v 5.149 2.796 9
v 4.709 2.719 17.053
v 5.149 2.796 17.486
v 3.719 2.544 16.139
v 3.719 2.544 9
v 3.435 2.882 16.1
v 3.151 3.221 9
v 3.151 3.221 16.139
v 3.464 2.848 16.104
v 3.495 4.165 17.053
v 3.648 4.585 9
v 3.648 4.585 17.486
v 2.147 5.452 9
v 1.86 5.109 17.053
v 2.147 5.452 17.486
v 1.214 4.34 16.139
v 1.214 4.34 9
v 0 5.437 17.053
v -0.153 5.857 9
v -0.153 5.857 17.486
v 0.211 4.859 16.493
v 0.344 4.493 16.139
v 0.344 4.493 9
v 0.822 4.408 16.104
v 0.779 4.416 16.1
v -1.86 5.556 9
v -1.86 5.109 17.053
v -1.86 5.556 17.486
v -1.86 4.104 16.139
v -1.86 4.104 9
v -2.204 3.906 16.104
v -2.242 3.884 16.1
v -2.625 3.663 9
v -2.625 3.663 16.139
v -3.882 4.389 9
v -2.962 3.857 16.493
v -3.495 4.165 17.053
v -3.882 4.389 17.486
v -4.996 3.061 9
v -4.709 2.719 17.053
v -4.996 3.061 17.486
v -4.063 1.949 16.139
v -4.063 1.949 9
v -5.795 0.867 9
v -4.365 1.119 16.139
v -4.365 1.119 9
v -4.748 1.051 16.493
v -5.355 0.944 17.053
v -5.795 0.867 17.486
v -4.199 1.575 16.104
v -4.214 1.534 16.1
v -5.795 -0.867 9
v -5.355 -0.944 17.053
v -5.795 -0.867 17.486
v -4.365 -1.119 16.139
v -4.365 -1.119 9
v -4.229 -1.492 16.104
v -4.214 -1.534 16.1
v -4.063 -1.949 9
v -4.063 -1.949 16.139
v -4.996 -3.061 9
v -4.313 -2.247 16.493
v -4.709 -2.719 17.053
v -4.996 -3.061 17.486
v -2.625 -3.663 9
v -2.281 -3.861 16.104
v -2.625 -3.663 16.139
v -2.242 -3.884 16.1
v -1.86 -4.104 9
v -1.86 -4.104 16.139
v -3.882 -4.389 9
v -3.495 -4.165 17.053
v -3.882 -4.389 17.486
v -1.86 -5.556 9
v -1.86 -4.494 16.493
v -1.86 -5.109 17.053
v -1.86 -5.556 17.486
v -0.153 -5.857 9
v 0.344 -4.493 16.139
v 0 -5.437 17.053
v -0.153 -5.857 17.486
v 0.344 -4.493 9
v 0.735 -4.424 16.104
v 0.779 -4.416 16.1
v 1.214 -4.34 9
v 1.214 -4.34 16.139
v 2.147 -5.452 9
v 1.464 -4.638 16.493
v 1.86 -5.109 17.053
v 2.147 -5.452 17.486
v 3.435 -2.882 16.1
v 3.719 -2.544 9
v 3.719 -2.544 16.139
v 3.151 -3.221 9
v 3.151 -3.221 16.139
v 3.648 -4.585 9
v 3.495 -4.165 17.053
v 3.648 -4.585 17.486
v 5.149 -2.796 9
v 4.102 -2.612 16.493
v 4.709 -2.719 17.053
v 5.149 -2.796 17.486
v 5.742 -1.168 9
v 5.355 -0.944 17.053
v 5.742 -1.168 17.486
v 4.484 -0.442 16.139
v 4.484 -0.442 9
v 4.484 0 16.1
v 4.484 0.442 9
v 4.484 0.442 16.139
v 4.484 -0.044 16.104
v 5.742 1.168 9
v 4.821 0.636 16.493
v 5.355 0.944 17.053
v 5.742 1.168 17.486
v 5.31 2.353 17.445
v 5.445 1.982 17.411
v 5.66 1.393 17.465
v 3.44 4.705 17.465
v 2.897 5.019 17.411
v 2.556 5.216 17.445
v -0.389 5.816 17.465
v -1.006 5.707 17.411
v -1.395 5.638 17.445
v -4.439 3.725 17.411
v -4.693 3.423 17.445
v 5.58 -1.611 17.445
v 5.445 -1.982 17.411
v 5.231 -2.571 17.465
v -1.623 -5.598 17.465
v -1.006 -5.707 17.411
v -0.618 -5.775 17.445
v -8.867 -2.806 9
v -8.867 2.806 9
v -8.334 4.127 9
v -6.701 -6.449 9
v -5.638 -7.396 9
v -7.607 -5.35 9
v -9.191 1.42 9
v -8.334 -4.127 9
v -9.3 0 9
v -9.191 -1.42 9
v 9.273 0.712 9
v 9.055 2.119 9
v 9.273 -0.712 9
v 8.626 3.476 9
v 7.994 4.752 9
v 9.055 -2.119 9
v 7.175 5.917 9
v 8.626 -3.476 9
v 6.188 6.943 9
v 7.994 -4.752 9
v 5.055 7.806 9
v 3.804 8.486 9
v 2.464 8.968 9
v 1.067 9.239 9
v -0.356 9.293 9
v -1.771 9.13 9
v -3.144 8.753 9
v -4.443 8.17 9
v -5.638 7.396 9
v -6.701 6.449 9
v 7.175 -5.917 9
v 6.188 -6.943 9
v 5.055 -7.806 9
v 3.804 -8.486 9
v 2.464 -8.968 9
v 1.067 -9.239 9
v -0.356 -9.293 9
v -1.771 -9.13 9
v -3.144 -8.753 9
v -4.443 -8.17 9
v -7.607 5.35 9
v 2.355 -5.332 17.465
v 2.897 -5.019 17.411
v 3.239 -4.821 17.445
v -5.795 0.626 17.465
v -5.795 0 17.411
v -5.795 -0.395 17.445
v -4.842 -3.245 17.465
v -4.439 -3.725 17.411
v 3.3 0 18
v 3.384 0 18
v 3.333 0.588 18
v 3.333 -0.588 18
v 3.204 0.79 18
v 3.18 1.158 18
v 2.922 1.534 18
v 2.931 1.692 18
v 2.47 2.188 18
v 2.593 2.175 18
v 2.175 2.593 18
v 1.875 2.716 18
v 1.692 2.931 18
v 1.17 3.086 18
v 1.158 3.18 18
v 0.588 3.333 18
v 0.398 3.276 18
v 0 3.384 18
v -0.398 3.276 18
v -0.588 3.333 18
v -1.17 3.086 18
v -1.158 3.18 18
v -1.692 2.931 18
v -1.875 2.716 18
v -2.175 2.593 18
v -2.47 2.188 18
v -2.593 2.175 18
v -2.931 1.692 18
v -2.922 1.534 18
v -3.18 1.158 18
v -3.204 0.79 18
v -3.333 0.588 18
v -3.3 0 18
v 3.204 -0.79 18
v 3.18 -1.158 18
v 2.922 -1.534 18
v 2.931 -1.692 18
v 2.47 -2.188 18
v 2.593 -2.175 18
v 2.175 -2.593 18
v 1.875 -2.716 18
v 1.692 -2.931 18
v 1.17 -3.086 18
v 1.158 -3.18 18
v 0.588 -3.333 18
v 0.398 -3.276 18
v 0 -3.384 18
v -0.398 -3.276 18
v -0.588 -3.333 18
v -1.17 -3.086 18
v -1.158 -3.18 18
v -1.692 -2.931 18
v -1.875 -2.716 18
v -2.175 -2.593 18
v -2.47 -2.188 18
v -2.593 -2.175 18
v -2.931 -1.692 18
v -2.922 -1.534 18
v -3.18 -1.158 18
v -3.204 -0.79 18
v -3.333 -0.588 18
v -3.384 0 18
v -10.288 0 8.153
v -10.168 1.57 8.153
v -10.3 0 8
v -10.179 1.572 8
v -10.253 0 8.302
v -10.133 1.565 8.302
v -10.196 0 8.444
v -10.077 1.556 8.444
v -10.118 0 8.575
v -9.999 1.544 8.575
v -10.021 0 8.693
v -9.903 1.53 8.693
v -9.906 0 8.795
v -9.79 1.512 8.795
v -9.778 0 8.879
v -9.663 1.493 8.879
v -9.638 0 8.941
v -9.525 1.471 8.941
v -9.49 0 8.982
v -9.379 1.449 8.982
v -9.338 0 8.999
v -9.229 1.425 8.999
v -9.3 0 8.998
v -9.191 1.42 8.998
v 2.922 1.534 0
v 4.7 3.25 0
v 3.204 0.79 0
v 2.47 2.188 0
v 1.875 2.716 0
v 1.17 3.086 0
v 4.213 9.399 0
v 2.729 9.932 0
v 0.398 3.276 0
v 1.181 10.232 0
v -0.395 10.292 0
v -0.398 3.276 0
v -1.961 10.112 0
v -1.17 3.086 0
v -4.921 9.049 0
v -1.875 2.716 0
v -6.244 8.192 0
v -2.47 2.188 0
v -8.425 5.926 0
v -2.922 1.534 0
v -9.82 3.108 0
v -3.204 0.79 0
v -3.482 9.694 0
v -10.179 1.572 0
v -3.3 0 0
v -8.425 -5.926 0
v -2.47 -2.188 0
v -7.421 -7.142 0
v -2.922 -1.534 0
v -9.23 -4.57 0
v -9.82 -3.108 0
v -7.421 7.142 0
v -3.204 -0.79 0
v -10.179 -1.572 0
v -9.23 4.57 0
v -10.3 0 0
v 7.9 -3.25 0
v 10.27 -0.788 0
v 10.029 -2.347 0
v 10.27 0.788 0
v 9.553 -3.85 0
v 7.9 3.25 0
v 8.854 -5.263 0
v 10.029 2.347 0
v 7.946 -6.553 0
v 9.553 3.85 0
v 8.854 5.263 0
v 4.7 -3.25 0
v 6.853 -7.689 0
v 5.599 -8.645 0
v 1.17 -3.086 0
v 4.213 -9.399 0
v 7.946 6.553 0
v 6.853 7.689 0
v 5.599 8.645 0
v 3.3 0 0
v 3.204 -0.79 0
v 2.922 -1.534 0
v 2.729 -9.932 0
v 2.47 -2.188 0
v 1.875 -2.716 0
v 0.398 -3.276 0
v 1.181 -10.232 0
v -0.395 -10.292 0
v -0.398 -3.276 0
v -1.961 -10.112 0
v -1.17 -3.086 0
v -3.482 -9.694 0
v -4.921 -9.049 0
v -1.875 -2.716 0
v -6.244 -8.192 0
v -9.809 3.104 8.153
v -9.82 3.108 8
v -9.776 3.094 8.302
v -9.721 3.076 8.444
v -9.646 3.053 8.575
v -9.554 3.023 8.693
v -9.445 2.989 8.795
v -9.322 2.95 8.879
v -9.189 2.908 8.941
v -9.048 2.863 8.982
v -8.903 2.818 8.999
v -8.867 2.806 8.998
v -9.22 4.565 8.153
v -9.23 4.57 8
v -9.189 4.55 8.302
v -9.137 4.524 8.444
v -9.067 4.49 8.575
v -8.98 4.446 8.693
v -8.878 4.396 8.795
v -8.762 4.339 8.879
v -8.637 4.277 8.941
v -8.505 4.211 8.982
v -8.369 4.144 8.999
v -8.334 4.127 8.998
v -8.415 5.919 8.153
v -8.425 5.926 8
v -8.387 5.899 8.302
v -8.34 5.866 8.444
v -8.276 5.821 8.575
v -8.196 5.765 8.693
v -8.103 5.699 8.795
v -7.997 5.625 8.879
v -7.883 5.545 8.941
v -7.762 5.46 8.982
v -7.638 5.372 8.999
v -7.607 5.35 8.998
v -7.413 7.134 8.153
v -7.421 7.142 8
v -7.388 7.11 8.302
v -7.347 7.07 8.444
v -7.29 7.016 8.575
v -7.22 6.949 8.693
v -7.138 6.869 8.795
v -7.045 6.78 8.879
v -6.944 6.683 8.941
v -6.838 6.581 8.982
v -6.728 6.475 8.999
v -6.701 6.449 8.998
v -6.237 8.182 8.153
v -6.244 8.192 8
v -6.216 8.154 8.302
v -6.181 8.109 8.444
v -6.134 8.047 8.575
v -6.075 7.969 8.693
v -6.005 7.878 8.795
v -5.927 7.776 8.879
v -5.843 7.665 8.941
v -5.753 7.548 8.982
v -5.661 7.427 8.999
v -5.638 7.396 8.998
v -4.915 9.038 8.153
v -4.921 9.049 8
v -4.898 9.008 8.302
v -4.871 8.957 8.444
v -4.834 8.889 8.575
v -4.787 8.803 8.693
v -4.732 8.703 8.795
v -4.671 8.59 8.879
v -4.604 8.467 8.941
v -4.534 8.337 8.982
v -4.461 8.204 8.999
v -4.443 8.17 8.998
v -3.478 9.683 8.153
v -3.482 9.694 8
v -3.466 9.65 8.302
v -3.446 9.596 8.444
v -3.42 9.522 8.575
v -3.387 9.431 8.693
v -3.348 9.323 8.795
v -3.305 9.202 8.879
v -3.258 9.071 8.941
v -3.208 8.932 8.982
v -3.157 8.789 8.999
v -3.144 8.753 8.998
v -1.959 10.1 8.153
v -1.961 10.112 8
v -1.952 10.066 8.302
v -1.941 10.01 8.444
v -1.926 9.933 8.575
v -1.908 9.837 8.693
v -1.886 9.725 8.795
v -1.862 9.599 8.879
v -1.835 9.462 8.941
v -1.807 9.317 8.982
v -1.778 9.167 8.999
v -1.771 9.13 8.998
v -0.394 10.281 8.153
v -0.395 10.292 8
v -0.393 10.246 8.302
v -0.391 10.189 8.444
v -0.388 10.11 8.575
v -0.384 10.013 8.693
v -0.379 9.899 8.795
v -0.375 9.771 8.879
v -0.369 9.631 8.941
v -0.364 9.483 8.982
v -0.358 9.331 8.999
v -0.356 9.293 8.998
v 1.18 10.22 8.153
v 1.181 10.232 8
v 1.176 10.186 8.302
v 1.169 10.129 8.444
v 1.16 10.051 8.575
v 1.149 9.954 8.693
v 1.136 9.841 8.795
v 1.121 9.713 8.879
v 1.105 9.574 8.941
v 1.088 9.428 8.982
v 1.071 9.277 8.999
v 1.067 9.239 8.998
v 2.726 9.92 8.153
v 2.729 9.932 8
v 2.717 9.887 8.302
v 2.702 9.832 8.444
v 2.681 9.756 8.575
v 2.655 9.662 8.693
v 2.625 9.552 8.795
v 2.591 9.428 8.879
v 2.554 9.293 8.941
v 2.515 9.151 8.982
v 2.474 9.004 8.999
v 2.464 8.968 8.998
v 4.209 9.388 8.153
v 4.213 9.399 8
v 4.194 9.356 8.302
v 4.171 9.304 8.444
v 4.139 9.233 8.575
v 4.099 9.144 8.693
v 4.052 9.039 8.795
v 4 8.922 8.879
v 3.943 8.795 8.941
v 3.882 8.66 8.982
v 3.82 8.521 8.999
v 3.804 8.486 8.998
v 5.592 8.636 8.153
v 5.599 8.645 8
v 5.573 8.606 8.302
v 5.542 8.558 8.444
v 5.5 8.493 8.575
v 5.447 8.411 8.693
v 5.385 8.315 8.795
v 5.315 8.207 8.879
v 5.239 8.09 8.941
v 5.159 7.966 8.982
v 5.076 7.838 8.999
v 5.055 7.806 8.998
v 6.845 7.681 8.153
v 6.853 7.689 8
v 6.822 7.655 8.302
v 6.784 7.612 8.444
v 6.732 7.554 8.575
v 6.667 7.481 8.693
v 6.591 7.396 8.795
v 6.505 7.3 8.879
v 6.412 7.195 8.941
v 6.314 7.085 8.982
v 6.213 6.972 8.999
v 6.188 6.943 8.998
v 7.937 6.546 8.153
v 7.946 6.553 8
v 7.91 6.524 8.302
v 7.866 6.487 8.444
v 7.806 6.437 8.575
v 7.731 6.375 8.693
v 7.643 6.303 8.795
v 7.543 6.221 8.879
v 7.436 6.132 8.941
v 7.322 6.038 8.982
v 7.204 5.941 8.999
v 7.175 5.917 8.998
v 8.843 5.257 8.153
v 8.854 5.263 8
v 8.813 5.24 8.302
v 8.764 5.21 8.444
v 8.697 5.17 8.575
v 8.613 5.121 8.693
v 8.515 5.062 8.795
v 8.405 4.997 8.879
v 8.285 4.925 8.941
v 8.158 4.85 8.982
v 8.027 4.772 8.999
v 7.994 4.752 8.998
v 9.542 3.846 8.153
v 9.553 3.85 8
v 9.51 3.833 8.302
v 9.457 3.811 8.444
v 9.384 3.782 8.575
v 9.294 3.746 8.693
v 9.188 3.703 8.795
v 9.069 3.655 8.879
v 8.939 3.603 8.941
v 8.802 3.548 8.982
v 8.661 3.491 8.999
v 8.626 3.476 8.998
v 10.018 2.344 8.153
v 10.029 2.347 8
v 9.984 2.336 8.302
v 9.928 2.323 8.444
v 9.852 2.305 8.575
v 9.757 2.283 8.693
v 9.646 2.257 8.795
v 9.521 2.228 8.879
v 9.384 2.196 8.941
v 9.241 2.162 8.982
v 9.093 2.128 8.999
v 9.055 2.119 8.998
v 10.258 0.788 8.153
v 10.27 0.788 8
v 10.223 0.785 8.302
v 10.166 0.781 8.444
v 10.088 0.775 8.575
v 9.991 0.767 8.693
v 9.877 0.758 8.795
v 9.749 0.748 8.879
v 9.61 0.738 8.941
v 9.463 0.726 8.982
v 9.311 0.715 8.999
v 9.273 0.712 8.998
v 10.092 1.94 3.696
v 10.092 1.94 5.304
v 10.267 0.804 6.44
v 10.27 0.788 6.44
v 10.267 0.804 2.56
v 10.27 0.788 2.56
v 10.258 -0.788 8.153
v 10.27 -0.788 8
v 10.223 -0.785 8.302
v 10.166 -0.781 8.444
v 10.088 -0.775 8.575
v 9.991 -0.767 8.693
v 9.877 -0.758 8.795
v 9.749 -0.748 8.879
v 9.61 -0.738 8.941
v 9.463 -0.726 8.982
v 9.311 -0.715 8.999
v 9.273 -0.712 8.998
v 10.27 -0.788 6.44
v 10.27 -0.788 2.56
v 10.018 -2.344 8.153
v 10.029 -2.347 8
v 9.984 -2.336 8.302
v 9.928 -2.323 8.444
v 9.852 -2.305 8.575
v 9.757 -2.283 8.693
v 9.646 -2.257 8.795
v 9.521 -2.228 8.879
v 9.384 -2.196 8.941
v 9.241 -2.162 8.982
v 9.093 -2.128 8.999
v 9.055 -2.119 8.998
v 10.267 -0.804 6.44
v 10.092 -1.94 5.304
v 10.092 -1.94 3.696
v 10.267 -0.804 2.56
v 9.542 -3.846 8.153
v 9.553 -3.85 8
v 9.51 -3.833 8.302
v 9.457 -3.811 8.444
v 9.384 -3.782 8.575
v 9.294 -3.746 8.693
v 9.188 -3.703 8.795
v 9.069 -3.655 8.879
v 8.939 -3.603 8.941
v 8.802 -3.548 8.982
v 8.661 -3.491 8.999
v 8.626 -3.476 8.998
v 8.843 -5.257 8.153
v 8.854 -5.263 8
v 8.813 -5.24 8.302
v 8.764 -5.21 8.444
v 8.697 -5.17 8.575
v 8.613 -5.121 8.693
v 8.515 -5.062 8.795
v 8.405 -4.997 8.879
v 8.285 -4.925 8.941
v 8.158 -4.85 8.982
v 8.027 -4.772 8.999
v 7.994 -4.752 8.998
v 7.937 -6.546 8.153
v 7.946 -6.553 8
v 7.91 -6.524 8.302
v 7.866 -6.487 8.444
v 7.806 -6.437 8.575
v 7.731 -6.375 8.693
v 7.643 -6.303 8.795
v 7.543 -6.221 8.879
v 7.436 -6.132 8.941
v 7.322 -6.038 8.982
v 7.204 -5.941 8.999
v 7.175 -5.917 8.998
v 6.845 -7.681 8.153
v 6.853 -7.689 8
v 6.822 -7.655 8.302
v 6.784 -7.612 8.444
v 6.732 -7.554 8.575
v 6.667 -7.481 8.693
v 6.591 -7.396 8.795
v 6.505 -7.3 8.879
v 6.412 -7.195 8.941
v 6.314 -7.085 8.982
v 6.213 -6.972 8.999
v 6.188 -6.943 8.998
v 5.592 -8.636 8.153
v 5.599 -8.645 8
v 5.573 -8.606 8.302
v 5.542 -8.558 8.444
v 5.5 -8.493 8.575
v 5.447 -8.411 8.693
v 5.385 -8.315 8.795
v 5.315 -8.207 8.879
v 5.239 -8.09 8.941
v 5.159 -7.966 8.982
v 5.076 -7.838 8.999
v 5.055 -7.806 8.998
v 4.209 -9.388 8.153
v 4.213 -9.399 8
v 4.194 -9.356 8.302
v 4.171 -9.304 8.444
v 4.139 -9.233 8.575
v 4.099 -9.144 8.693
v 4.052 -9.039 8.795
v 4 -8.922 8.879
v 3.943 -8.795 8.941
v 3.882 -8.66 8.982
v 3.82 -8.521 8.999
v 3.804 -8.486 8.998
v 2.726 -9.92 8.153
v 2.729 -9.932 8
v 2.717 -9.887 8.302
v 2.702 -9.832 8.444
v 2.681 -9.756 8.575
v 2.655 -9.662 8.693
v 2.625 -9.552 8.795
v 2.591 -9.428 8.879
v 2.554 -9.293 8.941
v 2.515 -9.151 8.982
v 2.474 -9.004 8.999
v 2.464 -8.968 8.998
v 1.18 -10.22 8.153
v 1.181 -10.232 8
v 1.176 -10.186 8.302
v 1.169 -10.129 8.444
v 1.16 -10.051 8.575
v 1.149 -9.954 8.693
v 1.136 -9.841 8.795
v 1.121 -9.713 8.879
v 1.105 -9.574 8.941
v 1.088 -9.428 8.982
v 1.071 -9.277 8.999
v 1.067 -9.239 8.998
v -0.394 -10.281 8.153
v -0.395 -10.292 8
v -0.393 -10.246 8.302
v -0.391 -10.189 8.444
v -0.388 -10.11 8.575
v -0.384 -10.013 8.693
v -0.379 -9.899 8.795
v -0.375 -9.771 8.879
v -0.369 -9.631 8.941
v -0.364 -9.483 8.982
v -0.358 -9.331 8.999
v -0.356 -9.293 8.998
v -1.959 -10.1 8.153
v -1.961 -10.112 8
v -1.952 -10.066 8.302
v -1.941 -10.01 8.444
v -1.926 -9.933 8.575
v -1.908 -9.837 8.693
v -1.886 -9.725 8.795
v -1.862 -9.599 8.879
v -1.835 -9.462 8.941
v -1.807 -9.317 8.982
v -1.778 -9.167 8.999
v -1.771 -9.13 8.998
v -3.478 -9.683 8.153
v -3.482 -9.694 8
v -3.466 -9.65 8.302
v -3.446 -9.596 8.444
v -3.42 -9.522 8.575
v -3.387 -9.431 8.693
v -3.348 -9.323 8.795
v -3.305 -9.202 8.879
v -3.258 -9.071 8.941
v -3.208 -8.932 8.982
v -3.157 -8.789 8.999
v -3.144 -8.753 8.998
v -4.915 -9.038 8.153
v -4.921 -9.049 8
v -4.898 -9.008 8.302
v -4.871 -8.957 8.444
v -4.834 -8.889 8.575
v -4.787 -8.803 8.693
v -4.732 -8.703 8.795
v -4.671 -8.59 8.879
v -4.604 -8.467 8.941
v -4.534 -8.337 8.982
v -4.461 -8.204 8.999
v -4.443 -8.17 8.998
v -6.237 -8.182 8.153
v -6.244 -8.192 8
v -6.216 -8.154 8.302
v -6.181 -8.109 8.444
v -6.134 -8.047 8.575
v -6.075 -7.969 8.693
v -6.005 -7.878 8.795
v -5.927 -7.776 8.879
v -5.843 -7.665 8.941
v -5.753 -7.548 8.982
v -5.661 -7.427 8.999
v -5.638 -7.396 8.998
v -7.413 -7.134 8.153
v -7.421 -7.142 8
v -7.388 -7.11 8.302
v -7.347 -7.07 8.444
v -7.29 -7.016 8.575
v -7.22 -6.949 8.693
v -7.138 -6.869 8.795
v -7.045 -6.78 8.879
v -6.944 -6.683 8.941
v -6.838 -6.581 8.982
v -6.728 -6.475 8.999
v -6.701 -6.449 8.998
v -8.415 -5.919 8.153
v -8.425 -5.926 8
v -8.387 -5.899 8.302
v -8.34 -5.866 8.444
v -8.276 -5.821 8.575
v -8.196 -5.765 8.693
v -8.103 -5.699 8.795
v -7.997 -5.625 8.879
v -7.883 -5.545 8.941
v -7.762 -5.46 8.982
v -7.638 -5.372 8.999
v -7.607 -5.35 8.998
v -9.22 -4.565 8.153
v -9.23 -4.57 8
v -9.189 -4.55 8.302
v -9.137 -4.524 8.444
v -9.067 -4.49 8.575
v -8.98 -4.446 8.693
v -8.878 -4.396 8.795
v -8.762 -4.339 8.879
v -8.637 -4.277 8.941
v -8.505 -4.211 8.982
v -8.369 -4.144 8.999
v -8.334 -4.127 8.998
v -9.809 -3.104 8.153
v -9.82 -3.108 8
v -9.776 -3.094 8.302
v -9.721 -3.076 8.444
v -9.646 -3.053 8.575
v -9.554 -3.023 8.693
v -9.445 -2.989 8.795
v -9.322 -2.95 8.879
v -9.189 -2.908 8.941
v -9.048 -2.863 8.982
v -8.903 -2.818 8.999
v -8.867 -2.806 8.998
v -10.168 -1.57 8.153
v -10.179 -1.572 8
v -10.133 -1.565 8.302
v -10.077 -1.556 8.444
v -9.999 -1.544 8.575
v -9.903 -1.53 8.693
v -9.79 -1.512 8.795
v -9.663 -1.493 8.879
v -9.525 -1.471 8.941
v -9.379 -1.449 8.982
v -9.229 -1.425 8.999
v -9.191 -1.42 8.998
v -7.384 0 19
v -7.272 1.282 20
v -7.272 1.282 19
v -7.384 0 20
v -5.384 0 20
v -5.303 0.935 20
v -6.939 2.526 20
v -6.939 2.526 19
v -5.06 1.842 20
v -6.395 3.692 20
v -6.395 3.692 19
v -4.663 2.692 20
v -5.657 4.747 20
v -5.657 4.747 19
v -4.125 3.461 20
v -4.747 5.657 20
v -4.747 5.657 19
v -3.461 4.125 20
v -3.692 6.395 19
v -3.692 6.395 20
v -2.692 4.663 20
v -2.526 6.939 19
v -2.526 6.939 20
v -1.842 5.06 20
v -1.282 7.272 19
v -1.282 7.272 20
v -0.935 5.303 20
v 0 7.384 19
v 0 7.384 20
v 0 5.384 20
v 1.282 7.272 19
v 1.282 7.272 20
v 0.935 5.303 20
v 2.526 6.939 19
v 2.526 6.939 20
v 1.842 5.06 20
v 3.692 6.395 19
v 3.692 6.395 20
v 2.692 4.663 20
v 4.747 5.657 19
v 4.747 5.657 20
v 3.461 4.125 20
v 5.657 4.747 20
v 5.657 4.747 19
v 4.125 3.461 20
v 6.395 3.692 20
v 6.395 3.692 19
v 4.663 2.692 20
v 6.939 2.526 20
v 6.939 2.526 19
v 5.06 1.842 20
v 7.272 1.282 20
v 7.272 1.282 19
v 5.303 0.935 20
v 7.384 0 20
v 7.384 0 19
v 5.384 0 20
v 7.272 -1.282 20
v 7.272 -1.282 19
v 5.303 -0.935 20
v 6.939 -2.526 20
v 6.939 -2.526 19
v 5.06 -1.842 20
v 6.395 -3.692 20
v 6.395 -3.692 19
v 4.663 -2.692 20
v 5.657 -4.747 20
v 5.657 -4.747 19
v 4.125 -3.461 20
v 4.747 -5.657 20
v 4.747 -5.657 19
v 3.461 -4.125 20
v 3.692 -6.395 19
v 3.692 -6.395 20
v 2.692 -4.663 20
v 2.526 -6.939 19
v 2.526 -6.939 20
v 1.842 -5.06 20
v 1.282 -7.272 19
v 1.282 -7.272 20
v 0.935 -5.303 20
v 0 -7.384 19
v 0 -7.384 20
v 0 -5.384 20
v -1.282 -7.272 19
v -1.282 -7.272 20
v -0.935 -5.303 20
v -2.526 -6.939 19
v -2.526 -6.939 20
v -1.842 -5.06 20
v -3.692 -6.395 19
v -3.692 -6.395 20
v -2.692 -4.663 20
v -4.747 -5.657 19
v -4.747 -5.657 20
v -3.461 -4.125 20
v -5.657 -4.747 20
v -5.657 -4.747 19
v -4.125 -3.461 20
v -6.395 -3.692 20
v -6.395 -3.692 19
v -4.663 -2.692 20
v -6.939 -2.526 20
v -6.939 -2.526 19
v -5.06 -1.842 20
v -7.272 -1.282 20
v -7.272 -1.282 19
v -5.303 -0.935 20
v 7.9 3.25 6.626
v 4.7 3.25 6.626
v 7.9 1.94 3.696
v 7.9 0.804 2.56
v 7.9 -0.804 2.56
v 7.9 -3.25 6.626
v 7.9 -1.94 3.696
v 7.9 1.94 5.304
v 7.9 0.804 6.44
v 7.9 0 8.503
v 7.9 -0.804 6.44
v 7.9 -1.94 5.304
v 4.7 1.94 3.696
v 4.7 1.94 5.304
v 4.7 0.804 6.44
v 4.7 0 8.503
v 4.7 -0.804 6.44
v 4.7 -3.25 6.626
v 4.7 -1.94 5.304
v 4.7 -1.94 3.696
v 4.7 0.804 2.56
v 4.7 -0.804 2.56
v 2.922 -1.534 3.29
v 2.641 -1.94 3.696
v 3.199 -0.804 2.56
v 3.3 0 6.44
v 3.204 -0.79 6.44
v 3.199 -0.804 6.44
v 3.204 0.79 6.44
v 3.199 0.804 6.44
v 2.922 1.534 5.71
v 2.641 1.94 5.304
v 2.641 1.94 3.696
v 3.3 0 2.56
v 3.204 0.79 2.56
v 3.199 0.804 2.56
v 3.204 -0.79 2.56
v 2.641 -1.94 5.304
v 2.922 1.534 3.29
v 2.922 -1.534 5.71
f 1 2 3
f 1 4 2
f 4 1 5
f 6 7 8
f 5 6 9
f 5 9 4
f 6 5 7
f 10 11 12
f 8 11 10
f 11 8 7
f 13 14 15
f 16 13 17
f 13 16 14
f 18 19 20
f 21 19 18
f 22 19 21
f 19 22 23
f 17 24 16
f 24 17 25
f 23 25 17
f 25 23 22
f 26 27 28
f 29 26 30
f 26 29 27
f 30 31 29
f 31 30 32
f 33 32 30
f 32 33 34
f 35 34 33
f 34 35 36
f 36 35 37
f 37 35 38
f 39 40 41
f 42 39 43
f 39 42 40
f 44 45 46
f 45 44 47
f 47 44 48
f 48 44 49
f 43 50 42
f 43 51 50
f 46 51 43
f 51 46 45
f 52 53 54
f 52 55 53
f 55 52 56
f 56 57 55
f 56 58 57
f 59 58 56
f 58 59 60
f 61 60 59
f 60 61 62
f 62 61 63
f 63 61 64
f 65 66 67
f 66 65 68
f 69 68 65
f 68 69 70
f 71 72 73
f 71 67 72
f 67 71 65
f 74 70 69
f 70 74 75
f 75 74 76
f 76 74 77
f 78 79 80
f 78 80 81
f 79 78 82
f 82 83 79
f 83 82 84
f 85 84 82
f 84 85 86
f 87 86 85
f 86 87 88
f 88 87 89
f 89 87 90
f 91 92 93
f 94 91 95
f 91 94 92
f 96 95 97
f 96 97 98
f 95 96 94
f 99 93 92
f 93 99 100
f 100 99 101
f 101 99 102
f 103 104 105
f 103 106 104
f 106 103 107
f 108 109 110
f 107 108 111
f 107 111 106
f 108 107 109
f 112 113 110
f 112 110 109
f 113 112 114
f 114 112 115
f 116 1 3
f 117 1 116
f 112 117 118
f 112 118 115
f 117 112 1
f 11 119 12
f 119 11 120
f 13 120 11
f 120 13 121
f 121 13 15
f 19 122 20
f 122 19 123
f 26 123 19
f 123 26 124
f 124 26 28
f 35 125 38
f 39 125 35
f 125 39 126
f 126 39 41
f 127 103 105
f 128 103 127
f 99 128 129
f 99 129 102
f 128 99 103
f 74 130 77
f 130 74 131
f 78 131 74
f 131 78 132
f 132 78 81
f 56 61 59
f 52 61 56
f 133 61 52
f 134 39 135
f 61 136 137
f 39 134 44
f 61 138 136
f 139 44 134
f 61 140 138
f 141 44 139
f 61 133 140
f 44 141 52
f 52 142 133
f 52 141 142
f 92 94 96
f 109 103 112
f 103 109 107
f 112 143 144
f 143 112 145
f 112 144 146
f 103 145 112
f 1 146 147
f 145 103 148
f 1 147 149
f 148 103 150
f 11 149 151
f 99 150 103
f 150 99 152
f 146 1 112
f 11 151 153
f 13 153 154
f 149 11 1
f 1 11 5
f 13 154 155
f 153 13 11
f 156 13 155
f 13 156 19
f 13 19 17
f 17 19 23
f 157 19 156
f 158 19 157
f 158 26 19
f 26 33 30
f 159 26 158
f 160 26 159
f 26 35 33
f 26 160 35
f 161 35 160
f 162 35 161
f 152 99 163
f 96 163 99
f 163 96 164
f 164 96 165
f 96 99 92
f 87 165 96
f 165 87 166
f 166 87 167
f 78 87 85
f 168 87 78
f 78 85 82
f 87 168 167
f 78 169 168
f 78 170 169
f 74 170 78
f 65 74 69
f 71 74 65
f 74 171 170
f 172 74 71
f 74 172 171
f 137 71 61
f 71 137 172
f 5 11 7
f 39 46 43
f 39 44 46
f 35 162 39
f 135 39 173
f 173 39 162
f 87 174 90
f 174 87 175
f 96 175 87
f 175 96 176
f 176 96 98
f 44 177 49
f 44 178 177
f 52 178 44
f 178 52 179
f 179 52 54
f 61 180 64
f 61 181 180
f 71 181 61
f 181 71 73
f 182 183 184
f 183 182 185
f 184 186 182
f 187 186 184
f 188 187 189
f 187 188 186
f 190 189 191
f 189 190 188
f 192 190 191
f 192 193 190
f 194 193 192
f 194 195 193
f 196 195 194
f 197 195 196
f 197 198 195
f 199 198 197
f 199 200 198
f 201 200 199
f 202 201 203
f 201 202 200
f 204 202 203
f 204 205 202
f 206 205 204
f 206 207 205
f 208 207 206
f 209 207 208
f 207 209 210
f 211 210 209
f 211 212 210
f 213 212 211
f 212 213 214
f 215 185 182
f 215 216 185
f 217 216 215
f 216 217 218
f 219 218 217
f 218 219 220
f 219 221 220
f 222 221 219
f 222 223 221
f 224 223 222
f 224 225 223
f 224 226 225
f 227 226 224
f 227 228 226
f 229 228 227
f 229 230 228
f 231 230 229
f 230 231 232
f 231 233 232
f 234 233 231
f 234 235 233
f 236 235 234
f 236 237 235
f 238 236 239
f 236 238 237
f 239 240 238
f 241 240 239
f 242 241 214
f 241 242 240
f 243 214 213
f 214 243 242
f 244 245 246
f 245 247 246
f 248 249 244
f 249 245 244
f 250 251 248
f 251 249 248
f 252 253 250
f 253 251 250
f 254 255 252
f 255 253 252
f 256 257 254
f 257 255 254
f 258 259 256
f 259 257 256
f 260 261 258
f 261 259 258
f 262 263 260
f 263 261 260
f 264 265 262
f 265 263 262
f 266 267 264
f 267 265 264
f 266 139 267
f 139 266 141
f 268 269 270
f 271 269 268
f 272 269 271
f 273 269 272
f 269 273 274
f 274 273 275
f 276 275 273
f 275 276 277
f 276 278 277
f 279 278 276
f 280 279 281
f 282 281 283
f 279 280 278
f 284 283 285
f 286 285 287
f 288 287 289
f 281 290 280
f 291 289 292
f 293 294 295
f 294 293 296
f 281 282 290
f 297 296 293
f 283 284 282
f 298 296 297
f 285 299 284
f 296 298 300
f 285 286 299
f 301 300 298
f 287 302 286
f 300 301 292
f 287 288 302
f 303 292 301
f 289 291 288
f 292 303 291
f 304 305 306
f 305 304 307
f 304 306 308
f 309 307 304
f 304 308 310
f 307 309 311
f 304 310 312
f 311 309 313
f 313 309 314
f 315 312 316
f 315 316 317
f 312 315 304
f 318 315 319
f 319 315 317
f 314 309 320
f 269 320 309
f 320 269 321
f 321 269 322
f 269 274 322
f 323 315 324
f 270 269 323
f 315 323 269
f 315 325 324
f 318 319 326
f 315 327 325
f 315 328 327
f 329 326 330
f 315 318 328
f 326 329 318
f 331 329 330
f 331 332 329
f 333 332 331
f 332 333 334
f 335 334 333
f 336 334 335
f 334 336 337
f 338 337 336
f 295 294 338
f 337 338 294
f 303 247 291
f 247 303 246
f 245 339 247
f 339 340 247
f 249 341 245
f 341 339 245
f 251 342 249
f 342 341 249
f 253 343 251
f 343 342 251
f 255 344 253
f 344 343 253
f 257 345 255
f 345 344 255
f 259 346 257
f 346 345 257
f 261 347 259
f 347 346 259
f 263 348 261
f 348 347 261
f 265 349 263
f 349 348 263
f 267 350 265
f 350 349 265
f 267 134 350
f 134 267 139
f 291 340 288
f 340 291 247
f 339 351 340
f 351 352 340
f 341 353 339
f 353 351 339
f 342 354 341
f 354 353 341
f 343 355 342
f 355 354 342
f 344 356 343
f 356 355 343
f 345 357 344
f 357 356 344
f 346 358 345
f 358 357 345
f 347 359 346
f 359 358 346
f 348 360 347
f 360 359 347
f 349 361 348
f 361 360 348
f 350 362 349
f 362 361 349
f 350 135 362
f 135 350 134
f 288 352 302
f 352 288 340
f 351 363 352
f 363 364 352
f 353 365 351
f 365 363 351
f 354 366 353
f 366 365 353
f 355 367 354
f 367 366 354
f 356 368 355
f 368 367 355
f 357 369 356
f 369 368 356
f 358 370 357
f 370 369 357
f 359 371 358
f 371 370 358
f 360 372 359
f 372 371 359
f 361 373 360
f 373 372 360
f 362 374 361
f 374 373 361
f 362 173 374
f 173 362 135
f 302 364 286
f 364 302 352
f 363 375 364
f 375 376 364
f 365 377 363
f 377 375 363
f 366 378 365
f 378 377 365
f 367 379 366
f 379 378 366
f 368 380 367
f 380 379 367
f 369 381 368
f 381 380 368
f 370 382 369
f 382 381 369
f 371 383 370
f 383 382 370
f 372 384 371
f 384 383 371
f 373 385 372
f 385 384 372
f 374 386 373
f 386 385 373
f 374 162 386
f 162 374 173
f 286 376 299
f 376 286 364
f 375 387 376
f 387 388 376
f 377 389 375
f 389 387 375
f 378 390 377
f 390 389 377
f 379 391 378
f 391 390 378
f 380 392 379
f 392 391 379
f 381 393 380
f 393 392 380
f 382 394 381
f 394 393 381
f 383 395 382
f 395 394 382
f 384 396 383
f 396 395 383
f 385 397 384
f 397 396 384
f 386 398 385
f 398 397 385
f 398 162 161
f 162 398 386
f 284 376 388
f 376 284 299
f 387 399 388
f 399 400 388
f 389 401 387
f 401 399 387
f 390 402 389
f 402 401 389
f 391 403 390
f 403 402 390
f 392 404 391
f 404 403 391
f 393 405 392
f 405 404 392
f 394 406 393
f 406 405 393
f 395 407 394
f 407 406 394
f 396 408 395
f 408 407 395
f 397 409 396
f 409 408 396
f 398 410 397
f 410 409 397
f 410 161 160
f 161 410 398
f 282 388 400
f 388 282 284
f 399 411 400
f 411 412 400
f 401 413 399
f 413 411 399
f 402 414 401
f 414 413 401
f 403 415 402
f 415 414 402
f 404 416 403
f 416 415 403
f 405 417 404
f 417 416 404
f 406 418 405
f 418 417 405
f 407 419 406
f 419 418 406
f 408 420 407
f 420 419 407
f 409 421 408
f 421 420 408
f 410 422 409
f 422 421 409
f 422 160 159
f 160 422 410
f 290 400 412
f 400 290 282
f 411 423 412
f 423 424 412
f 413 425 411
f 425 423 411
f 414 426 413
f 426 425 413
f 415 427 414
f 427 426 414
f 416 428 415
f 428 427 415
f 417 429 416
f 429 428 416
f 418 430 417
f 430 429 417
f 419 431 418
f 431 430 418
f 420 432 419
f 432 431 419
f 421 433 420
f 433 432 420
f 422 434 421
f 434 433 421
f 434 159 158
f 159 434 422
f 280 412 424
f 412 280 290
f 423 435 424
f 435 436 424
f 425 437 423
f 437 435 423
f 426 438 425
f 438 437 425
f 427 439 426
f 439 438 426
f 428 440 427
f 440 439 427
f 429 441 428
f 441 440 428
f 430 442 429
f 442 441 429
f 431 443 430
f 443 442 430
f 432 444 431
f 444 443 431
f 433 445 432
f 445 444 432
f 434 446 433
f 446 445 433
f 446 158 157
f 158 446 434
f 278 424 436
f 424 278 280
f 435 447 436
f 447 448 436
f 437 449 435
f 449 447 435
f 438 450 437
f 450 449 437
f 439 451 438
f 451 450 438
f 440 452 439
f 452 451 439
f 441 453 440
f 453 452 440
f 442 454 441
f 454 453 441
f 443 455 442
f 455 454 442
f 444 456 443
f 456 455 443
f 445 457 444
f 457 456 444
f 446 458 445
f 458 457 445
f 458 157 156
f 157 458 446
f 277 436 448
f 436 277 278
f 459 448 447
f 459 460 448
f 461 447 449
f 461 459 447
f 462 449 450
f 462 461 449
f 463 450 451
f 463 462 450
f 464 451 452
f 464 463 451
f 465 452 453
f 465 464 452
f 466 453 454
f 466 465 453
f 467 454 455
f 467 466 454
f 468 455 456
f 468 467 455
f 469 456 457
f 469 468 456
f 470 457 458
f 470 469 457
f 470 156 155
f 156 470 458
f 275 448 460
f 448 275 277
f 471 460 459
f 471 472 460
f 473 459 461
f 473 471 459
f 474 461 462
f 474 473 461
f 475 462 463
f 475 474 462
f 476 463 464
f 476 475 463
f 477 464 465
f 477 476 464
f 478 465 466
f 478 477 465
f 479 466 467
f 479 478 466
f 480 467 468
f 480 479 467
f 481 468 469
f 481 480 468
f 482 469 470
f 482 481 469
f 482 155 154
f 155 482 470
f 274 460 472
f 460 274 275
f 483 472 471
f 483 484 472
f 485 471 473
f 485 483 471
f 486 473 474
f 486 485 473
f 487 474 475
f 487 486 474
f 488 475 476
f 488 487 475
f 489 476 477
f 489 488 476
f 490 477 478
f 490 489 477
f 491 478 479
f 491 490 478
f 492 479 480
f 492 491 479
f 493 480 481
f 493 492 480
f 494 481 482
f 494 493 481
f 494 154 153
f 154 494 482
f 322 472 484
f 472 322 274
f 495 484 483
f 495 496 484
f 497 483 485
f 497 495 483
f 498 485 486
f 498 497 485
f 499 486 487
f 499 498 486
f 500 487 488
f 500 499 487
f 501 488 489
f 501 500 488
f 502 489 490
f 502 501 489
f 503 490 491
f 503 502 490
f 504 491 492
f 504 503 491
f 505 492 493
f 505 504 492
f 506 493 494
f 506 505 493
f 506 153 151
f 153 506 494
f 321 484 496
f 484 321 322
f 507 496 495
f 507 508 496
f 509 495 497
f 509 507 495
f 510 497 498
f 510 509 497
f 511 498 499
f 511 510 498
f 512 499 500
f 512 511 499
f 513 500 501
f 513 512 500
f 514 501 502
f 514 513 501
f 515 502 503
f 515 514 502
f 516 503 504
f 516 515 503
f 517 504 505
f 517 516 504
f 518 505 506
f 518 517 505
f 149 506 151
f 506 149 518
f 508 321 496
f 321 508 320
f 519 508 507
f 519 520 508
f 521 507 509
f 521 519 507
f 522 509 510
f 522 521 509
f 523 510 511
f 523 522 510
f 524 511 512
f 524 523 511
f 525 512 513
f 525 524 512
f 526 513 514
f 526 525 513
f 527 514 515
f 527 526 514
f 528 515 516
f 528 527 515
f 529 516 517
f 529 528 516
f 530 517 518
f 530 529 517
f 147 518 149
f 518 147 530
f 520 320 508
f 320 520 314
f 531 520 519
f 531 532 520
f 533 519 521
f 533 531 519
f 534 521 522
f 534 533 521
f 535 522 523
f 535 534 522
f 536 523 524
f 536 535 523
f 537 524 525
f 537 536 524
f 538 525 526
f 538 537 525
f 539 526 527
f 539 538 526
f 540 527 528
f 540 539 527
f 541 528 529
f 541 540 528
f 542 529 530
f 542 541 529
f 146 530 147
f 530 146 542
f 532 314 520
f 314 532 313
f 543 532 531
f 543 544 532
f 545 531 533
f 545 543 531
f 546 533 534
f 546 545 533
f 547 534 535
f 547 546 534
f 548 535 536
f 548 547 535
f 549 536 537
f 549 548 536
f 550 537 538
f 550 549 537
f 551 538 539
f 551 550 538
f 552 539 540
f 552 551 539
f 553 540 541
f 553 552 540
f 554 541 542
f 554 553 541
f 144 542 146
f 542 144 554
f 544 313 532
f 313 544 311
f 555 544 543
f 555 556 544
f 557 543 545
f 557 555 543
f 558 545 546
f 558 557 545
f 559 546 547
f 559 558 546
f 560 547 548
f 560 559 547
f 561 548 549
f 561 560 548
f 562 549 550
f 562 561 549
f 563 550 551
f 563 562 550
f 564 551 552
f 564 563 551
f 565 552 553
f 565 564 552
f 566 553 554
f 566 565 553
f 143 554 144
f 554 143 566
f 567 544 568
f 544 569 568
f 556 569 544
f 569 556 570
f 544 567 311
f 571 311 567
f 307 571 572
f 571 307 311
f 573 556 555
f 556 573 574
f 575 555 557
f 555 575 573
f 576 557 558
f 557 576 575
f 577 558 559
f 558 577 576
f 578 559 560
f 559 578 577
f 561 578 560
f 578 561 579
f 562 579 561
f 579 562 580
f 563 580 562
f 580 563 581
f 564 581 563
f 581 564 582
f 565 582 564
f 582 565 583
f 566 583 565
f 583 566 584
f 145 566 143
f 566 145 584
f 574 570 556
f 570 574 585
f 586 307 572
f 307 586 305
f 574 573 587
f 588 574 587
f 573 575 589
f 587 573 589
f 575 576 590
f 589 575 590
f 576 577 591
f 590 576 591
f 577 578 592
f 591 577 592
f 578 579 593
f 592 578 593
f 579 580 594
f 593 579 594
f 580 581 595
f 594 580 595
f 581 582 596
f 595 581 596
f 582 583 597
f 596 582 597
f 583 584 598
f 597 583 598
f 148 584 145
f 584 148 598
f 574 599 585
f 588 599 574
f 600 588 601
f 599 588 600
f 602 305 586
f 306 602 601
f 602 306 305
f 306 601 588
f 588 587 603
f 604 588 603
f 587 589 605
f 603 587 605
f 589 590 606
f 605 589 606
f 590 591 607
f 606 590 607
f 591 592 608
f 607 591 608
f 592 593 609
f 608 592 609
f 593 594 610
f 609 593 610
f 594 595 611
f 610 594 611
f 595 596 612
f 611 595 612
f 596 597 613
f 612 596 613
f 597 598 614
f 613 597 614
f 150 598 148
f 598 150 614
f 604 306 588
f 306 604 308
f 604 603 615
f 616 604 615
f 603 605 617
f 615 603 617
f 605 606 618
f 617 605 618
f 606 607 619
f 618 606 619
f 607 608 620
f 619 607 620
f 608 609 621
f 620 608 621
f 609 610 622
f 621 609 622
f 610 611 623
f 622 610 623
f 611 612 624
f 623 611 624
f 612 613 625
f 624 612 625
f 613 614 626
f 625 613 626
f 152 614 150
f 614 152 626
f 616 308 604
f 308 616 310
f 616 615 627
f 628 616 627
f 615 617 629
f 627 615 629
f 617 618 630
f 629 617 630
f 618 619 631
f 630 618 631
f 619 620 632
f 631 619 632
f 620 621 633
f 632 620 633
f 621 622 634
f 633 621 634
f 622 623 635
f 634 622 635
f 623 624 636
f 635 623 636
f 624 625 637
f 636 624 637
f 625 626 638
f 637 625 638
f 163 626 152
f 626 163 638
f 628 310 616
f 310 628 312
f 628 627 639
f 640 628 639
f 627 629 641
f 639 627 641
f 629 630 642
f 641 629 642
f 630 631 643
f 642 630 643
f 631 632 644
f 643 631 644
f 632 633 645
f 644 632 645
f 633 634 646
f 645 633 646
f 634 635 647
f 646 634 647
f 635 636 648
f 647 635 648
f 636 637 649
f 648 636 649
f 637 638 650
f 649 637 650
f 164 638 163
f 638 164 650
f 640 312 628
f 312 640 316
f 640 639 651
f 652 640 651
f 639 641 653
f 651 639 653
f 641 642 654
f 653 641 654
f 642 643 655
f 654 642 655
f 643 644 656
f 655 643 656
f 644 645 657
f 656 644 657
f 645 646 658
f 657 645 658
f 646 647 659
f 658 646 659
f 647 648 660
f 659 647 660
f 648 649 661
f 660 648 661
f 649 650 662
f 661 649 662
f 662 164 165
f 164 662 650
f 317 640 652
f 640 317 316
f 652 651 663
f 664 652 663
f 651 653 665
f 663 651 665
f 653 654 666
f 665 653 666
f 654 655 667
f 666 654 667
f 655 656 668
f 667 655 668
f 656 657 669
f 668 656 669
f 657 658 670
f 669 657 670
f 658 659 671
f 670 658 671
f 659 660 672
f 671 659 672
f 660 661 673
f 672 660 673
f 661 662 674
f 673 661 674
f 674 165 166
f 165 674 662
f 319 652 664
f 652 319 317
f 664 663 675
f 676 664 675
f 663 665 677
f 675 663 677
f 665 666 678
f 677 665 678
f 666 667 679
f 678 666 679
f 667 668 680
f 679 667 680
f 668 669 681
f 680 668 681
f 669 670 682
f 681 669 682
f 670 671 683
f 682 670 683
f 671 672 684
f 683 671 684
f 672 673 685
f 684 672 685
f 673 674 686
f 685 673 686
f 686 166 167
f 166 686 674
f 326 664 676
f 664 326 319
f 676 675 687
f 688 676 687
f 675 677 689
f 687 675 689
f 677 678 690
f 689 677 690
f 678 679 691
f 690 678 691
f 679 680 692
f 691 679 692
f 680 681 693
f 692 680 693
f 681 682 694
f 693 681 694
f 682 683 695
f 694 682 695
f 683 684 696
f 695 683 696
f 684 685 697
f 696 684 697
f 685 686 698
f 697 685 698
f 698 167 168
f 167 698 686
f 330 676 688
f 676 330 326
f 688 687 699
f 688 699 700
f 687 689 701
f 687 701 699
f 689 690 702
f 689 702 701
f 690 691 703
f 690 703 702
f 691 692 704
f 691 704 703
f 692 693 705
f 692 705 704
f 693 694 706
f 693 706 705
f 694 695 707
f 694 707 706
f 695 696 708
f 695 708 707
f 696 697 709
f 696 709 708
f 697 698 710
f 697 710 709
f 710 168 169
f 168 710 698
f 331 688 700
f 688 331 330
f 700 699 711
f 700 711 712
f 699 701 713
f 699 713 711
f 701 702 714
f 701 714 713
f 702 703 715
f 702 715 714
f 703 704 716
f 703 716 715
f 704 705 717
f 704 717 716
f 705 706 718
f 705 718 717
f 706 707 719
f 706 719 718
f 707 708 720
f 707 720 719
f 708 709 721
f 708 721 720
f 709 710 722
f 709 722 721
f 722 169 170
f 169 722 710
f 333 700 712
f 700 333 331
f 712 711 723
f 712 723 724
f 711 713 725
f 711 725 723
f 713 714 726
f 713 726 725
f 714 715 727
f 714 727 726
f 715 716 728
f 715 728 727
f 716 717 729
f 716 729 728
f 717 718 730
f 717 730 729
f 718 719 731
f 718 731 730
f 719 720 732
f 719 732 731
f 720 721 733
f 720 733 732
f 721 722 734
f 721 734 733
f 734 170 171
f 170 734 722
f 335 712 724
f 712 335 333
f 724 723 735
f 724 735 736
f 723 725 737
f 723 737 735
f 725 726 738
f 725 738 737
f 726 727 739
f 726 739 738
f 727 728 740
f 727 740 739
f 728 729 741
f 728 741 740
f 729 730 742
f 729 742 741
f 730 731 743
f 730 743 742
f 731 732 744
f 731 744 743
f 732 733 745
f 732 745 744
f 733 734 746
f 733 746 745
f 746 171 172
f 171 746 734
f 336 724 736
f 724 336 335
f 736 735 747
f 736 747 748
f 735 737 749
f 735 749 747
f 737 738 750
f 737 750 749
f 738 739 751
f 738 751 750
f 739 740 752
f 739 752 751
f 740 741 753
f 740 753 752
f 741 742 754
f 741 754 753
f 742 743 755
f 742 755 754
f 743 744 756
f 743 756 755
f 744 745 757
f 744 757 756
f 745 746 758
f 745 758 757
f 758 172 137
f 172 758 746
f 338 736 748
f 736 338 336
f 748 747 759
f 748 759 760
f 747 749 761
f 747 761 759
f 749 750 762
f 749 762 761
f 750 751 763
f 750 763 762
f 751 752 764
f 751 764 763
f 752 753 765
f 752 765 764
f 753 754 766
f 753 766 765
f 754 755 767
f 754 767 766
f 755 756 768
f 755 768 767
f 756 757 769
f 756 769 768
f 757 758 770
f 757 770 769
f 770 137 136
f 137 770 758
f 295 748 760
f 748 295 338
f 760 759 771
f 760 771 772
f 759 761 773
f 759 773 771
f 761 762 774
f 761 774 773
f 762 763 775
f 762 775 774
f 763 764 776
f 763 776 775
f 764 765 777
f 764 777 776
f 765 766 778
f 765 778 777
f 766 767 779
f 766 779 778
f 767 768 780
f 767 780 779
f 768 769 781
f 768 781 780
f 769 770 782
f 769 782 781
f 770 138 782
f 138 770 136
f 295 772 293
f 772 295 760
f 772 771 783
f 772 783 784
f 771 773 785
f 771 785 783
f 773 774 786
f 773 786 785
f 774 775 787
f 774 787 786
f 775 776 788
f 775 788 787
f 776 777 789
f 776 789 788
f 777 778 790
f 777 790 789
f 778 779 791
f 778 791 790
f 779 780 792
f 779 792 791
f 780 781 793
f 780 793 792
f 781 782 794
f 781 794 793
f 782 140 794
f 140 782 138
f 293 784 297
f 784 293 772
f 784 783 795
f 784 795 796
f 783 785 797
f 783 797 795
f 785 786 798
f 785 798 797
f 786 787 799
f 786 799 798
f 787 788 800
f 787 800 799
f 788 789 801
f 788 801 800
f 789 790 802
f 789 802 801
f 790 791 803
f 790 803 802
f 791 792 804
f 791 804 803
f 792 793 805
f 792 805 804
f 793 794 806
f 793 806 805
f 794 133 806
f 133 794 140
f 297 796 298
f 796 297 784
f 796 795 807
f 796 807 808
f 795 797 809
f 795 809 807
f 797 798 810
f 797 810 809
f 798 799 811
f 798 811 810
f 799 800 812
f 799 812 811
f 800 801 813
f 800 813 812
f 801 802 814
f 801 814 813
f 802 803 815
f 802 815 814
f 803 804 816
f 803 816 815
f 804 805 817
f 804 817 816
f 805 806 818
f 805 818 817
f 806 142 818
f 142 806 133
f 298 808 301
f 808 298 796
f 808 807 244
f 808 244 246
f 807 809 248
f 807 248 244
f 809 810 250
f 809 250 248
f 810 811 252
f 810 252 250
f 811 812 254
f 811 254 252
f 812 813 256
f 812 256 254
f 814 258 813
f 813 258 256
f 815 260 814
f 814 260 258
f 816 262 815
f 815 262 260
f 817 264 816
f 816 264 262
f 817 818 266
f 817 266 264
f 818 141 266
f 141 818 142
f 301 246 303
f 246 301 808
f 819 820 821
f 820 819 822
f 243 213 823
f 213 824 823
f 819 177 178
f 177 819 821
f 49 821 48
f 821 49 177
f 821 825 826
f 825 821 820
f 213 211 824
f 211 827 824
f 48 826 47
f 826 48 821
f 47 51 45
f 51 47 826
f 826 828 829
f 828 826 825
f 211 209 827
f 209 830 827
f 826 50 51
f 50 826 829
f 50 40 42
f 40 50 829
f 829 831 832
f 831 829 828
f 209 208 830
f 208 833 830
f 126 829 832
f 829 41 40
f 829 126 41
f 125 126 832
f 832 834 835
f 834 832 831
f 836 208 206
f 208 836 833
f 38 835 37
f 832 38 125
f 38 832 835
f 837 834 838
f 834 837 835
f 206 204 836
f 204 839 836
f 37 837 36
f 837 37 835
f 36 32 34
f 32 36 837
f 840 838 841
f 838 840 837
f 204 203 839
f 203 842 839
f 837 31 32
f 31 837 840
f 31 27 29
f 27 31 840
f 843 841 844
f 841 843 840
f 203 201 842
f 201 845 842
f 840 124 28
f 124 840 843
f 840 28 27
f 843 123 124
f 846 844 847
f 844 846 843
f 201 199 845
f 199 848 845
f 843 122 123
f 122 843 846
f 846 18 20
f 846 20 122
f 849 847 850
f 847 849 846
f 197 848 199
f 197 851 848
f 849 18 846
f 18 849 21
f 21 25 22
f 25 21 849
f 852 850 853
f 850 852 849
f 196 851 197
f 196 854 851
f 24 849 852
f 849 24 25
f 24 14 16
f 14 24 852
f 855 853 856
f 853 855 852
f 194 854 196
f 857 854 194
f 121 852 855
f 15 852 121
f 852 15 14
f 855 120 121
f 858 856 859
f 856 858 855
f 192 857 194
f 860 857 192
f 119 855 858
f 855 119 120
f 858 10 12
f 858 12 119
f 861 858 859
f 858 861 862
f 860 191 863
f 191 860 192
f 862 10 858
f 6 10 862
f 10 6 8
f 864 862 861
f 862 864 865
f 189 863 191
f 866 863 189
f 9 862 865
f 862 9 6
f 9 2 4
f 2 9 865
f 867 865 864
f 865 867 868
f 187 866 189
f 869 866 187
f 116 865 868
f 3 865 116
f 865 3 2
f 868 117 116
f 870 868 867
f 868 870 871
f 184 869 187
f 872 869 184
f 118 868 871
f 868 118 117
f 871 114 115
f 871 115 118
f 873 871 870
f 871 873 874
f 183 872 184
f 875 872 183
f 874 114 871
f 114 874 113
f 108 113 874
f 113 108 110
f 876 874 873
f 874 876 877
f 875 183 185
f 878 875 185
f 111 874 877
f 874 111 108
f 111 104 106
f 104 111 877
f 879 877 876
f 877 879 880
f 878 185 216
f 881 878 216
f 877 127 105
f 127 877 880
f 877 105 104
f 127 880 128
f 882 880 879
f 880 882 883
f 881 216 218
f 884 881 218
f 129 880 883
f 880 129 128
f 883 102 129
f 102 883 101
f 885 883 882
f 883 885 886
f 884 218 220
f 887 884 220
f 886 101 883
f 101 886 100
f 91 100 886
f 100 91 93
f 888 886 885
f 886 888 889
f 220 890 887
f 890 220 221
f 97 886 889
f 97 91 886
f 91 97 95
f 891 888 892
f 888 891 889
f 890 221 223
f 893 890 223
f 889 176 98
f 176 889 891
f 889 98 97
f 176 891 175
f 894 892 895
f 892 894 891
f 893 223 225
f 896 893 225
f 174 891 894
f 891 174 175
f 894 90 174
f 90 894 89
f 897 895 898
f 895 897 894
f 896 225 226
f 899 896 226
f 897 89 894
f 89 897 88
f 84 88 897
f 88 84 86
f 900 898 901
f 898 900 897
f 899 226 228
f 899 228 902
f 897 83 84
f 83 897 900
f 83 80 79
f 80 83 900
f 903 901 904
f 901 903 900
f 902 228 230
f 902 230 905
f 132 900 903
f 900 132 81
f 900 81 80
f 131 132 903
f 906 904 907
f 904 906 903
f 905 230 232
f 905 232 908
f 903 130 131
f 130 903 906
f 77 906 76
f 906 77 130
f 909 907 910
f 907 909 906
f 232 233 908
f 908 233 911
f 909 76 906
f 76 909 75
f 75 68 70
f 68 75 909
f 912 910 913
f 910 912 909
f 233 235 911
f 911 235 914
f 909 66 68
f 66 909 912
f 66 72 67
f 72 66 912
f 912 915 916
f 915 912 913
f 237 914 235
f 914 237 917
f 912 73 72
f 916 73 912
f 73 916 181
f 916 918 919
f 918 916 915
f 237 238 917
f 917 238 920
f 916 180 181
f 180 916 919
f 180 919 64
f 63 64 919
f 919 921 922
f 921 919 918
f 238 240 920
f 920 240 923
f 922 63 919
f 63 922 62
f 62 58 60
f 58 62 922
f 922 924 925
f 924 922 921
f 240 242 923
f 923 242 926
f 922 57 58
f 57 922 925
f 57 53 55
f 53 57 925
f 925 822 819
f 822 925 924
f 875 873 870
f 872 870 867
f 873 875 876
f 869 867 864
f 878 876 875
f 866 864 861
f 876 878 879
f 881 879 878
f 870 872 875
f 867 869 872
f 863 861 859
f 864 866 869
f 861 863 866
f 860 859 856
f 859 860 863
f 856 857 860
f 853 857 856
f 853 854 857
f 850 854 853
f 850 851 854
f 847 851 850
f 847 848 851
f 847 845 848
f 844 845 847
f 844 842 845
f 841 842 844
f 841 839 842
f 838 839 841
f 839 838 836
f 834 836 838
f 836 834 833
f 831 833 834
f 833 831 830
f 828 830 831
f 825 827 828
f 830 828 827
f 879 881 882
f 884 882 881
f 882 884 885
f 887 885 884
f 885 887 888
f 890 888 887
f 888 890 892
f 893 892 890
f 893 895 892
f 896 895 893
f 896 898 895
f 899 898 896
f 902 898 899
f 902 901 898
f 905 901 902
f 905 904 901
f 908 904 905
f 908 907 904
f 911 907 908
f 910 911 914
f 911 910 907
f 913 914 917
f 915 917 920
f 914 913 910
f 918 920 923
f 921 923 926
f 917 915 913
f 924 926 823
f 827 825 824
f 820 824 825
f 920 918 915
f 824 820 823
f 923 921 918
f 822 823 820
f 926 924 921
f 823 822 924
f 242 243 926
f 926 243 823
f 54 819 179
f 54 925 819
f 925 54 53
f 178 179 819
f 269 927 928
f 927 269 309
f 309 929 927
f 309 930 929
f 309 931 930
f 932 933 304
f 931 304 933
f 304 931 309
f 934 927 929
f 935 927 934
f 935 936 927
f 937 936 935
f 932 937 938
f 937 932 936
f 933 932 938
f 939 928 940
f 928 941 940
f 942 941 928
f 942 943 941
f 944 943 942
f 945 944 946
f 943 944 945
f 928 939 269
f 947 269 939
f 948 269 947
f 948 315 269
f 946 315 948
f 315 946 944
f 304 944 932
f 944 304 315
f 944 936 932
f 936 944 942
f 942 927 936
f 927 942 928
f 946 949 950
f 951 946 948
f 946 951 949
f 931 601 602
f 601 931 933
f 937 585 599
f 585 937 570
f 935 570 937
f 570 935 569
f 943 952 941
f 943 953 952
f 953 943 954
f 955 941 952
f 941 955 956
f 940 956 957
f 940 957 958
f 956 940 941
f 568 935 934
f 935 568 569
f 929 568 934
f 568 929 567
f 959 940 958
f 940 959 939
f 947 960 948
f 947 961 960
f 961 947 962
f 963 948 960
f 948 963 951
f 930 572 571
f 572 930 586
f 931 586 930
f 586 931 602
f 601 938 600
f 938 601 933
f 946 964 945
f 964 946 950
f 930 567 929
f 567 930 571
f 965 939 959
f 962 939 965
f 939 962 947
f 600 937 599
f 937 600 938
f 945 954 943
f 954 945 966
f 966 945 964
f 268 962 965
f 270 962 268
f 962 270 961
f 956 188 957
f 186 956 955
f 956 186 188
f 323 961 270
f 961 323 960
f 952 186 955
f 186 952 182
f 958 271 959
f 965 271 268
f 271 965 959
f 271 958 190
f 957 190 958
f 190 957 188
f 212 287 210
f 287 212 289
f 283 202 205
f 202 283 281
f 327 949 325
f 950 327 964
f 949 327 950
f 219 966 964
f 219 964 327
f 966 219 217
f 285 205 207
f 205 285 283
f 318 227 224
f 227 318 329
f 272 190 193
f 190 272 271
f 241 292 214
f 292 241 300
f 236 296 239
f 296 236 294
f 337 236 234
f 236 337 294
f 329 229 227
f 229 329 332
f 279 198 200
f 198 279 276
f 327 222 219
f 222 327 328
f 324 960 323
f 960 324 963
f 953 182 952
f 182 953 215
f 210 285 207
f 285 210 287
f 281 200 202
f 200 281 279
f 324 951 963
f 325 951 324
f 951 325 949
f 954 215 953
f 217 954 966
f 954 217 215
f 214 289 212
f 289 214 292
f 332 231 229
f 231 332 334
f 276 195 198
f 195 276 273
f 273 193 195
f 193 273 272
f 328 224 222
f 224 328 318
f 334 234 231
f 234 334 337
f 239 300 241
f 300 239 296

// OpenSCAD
// Belt pulley is http://www.thingiverse.com/thing:3104 by GilesBathgate
// GPLV3
// Made parametric by droftarts September 2011
// extra mods by triffid_hunter

/**
 * @name Pulley
 * @category Printed
 * @using 1 x m3 nut, normal or nyloc
 * @using 1 x m3x10 set screw or 1 x m3x8 grub screw
 */

module pulley()
{

// tuneable constants

m3_dia = 4.2;		// 3mm hole diameter
m3_nut_hex = 1;		// 1 for hex, 0 for square nut
m3_nut_flats = 6.5;	// normal M3 hex nut exact width = 5.5
m3_nut_depth = 3.2;	// normal M3 hex nut exact depth = 2.4, nyloc = 4
motor_shaft = 6.6;	// NEMA17 motor shaft exact diameter = 5

retainer = 1;		// Belt retainer end, 1 for Yes, 0 for No
idler = 0;			// 0 = No, 1 = Yes; fills in dish of retainer, if required
retainer_ht = 4;		// height of retainer flange over pulley, standard = 4. Indented into pulley by 2mm.

teeth = 9;			// Number of teeth, standard Mendel = 8
tooth_width = 2.5;	// width of base of tooth, exact size for T5 = 2.65, XL = 2.6124. Increase to improve fit.
tooth_angle = 60;	// angle of tooth sides, exact angle for T5 = 40, XL = 50
tooth_height = 1.4;	// height of tooth, exact size for T5 = 1.2, XL = 1.3 Increase to improve fit.

pulley_t_ht = 9;	// length of toothed part of pulley, standard = 12
pulley_b_ht = 9;		// 8 pulley base height, standard = 8
pulley_b_dia = 20.6;	// pulley base diameter, standard = 20
no_of_nuts = 1;		// number of captive nuts required, standard = 1
nut_angle = 90;		// angle between nuts, standard = 90
nut_shaft_distance = 1.4;	// distance between inner face of nut and shaft. standard = 1. Can be negative if your motor has D-shaft or filed flat. Do not set to zero or openscad will make a bad STL

// BELT SELECTION - uncomment preferred belt type
belt_type = "VAC";
teeth_dia = ((1.41 * pow(teeth,1.08)) / (0.84 + pow(teeth,1.08))) * teeth;

//belt_type = "T5";
//teeth_dia = ((1.591 * pow(teeth,1.064)) / (0.6523 + pow(teeth,1.064))) * teeth;

//belt_type = "XL"; 
//teeth_dia = ((1.617 * pow(teeth,1.021)) / (0.339 + pow(teeth,1.021))) * teeth;

echo (str("Belt type = ",belt_type,"; number of teeth = ",teeth,"; teeth diameter = ",teeth_dia,"mm"));

// calculated constants

nut_elevation = pulley_b_ht/2;
m3_nut_points = 2*((m3_nut_flats/2)/cos(30)); // This is needed for the nut trap

// Modules

	module spur()
	{
	linear_extrude(height=pulley_t_ht+2) polygon([[0,-(tooth_width/2)],[0,(tooth_width/2)],[-tooth_height,((tooth_width/2)-(tan(tooth_angle/2)*tooth_height))],[-tooth_height,-((tooth_width/2)-(tan(tooth_angle/2)*tooth_height))]],[[0,1,2,3,0]]);
	}

	module retainer()
	{
	rotate_extrude($fn=teeth*4) translate([teeth_dia/2-2.5,0,0]) 
	polygon([[0,0],[1,0],[retainer_ht , retainer_ht - 1],[retainer_ht , retainer_ht],[retainer_ht-2 , retainer_ht],[0,2]],[[0,1,2,3,4,5,0]]);
	}

// Main

difference()
 {	 
 	union()
 	{
 		//base

		if ( pulley_b_ht < 2 ) { echo ("CAN'T DRAW PULLEY BASE, HEIGHT LESS THAN 2!!!"); } else {
 			rotate_extrude($fn=pulley_b_dia*2)
 			{
 					square([pulley_b_dia/2-1,pulley_b_ht]);
 					square([pulley_b_dia/2,pulley_b_ht-1]);
 					translate([pulley_b_dia/2-1,pulley_b_ht-1]) circle(1);
 			}
		}

	difference()
		{
	    	//shaft - diameter is outside diameter of pulley
		translate([0,0,pulley_b_ht]) rotate ([0,0,360/(teeth*4)]) cylinder(r=teeth_dia/2,h=pulley_t_ht, $fn=teeth*2);

	    	//teeth - cut out of shaft
		for(i=[1:teeth]) rotate([0,0,i*(360/teeth)])
		translate([teeth_dia/2,0,pulley_b_ht-1]) spur();
		}
    	
	//belt retainer end
	if ( retainer > 0 ) {translate ([0,0,pulley_b_ht + pulley_t_ht -2]) retainer();
	if ( idler > 0 ) {translate ([0,0,pulley_b_ht + pulley_t_ht]) cylinder(r1=teeth_dia/2-1,r2=(teeth_dia/2-2) + (retainer_ht-2),h=retainer_ht-2,$fn=teeth*4);}}

	}
   
	//hole for motor shaft
    translate([0,0,-1])cylinder(r=motor_shaft/2,h=pulley_b_ht + pulley_t_ht + (retainer_ht),$fn=motor_shaft*4);
    		
    //captive nut and grub screw holes

	if ( pulley_b_ht < m3_nut_flats ) { echo ("CAN'T DRAW CAPTIVE NUTS, HEIGHT LESS THAN NUT DIAMETER!!!"); } else {
	if ( (pulley_b_dia - motor_shaft)/2 < m3_nut_depth + 3 ) { echo ("CAN'T DRAW CAPTIVE NUTS, DIAMETER TOO SMALL FOR NUT DEPTH!!!"); } else {

		for(j=[1:no_of_nuts]) rotate([0,0,j*nut_angle])
		translate([0,0,nut_elevation])rotate([90,0,0])

		union()
		{
			//entrance
			translate([0,-pulley_b_ht/4-0.5,motor_shaft/2+m3_nut_depth/2+nut_shaft_distance]) cube([m3_nut_flats,pulley_b_ht/2+1,m3_nut_depth],center=true);

			//nut
			if ( m3_nut_hex > 0 )
				{
					// hex nut
					translate([0,0.25,motor_shaft/2+m3_nut_depth/2+nut_shaft_distance]) rotate([0,0,30]) cylinder(r=m3_nut_points/2,h=m3_nut_depth,center=true,$fn=6);
				} else {
					// square nut
					translate([0,0.25,motor_shaft/2+m3_nut_depth/2+nut_shaft_distance]) cube([m3_nut_flats,m3_nut_flats,m3_nut_depth],center=true);
				}

			//grub screw hole
			rotate([0,0,22.5])cylinder(r=m3_dia/2,h=pulley_b_dia/2+1,$fn=8);
		}
	}}
 }
   
}

pulley();
